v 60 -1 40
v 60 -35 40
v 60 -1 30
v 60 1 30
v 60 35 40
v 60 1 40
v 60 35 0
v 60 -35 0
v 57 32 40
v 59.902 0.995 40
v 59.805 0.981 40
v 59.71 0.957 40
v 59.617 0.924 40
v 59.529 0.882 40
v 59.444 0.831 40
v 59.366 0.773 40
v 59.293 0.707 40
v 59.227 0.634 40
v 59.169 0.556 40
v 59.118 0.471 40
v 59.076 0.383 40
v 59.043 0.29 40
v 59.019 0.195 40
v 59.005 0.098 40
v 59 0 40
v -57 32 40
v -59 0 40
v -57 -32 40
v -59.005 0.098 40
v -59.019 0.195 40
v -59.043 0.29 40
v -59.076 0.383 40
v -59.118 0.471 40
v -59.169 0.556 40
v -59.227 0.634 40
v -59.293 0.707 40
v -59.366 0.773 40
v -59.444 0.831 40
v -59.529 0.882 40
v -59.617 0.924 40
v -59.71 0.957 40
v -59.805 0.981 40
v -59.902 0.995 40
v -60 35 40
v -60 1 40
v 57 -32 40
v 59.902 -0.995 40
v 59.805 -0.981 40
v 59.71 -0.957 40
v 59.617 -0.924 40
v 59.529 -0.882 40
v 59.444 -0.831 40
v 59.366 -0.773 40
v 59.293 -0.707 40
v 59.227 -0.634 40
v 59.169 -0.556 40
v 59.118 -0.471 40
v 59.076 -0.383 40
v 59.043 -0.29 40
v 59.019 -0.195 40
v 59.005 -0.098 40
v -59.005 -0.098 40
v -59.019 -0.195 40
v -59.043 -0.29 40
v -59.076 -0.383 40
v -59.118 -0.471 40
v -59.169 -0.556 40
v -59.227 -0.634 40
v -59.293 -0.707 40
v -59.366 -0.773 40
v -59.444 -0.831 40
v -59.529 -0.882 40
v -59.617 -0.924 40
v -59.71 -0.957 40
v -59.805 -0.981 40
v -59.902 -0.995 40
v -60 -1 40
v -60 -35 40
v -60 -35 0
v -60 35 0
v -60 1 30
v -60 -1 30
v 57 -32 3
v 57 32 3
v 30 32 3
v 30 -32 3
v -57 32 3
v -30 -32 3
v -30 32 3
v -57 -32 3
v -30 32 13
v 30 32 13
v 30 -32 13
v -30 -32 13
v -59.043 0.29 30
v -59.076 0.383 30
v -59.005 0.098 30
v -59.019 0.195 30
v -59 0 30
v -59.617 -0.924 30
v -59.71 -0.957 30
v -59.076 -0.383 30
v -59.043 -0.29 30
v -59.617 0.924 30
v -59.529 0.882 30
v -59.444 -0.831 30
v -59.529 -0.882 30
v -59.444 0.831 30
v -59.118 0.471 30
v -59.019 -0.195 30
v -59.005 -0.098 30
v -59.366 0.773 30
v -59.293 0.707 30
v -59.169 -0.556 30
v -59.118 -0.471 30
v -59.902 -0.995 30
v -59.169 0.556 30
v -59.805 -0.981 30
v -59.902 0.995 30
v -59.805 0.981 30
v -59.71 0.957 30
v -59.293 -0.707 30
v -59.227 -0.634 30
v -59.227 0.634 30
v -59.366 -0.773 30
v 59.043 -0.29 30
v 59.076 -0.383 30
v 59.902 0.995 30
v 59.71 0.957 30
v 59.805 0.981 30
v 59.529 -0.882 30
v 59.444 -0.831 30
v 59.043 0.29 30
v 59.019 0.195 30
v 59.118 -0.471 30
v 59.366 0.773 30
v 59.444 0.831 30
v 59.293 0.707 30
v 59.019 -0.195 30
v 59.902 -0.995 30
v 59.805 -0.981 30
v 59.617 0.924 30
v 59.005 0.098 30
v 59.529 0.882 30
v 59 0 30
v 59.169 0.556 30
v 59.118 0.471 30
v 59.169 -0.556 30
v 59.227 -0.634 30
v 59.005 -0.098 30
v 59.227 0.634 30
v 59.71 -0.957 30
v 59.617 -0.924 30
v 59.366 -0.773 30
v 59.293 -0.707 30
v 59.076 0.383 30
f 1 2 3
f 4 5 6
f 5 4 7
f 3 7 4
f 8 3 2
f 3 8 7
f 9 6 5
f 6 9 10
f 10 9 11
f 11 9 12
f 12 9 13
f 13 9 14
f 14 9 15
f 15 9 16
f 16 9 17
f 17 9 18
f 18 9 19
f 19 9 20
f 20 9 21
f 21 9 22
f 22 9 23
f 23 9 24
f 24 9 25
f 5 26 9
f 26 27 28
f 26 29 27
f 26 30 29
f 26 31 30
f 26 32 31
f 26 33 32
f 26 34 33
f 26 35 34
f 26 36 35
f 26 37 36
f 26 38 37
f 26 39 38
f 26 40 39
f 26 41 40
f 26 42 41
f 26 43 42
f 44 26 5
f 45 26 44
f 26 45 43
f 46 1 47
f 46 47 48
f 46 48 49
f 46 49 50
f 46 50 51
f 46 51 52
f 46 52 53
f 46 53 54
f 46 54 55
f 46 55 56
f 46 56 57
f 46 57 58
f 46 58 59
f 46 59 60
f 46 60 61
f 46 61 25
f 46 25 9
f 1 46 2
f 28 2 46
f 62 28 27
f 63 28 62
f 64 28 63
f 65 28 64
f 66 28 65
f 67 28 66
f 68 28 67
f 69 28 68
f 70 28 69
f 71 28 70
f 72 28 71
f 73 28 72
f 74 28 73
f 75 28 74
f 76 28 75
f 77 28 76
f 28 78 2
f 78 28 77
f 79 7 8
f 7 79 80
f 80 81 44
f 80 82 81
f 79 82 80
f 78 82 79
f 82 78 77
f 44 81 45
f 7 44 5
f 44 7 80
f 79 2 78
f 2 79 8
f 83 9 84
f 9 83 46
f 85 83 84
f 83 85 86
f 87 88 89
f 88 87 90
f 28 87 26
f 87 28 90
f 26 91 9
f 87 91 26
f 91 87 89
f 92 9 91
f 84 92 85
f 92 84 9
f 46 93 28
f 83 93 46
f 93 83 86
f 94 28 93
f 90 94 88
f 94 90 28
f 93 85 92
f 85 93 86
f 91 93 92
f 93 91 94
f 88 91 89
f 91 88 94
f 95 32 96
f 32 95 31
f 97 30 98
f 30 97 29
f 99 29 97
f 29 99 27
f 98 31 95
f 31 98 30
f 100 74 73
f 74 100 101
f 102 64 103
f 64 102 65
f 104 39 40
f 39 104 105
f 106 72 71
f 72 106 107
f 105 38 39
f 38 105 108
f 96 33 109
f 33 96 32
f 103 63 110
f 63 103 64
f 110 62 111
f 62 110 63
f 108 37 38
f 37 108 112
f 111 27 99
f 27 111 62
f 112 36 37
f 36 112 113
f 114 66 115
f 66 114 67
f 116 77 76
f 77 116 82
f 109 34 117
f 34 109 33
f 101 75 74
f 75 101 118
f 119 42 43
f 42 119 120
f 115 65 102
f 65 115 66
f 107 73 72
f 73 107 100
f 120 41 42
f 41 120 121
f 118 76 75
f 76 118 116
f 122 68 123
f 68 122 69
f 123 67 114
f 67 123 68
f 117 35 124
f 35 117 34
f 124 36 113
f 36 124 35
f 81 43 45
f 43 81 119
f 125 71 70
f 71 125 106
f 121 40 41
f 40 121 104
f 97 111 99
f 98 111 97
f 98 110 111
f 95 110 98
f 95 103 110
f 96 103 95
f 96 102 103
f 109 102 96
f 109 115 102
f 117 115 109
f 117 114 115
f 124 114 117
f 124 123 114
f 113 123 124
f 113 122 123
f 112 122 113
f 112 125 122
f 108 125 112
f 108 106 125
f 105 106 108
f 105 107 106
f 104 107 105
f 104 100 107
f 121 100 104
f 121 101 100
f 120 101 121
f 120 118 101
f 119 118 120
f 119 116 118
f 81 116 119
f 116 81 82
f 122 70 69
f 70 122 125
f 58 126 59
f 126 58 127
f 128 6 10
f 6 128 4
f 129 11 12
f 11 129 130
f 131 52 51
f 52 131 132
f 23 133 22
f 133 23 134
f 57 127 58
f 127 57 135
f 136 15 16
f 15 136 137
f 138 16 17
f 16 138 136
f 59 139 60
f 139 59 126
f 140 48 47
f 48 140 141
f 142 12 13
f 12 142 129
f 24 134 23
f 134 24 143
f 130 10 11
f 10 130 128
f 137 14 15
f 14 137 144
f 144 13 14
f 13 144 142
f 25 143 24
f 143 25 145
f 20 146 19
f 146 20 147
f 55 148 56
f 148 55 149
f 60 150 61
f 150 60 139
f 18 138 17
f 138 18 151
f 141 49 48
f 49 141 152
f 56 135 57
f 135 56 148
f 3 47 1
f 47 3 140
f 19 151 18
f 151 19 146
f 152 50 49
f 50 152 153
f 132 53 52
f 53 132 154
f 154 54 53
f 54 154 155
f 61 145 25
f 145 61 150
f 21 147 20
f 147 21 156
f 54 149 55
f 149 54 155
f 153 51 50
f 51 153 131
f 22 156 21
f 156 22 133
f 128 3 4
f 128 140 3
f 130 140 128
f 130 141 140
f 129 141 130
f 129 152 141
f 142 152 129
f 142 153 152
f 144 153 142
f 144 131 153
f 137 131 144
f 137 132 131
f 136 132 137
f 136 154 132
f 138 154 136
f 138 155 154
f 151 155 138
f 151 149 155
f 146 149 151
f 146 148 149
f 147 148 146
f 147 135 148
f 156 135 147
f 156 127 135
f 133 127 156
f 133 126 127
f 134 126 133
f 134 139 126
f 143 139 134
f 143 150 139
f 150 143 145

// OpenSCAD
$fn = 64;

// Outer dimensions
outer_x = 120;
outer_y = 70;
outer_z = 40;

// Wall and floor thickness
wall_thick = 3;
floor_thick = 3;

// Derived inner dimensions
inner_x = outer_x - 2 * wall_thick;
inner_y = outer_y - 2 * wall_thick;
inner_z = outer_z - floor_thick;

// Platform dimensions
plat_x = 60;
plat_y = inner_y;
plat_top_z = 13;
plat_bottom_z = floor_thick;
plat_height = plat_top_z - plat_bottom_z;

// Hole dimensions
hole_diam = 2;
hole_z = 30;
hole_y = 0;
hole_x_pos = outer_x / 2;

// Build the part
difference() {
    union() {
        // Tank shell (outer box minus inner cavity)
        difference() {
            translate([-outer_x / 2, -outer_y / 2, 0]) cube([outer_x, outer_y, outer_z], center = false);
            translate([-outer_x / 2 + wall_thick, -outer_y / 2 + wall_thick, floor_thick]) cube([inner_x, inner_y, inner_z], center = false);
        }
        // Raised platform
        translate([-plat_x / 2, -plat_y / 2, plat_bottom_z]) cube([plat_x, plat_y, plat_height], center = false);
    }
    // Electrode holes
    for (x = [-hole_x_pos, hole_x_pos]) {
        translate([x, hole_y, hole_z]) cylinder(r = hole_diam / 2, h = outer_z + 0.1, center = false);
    }
}
